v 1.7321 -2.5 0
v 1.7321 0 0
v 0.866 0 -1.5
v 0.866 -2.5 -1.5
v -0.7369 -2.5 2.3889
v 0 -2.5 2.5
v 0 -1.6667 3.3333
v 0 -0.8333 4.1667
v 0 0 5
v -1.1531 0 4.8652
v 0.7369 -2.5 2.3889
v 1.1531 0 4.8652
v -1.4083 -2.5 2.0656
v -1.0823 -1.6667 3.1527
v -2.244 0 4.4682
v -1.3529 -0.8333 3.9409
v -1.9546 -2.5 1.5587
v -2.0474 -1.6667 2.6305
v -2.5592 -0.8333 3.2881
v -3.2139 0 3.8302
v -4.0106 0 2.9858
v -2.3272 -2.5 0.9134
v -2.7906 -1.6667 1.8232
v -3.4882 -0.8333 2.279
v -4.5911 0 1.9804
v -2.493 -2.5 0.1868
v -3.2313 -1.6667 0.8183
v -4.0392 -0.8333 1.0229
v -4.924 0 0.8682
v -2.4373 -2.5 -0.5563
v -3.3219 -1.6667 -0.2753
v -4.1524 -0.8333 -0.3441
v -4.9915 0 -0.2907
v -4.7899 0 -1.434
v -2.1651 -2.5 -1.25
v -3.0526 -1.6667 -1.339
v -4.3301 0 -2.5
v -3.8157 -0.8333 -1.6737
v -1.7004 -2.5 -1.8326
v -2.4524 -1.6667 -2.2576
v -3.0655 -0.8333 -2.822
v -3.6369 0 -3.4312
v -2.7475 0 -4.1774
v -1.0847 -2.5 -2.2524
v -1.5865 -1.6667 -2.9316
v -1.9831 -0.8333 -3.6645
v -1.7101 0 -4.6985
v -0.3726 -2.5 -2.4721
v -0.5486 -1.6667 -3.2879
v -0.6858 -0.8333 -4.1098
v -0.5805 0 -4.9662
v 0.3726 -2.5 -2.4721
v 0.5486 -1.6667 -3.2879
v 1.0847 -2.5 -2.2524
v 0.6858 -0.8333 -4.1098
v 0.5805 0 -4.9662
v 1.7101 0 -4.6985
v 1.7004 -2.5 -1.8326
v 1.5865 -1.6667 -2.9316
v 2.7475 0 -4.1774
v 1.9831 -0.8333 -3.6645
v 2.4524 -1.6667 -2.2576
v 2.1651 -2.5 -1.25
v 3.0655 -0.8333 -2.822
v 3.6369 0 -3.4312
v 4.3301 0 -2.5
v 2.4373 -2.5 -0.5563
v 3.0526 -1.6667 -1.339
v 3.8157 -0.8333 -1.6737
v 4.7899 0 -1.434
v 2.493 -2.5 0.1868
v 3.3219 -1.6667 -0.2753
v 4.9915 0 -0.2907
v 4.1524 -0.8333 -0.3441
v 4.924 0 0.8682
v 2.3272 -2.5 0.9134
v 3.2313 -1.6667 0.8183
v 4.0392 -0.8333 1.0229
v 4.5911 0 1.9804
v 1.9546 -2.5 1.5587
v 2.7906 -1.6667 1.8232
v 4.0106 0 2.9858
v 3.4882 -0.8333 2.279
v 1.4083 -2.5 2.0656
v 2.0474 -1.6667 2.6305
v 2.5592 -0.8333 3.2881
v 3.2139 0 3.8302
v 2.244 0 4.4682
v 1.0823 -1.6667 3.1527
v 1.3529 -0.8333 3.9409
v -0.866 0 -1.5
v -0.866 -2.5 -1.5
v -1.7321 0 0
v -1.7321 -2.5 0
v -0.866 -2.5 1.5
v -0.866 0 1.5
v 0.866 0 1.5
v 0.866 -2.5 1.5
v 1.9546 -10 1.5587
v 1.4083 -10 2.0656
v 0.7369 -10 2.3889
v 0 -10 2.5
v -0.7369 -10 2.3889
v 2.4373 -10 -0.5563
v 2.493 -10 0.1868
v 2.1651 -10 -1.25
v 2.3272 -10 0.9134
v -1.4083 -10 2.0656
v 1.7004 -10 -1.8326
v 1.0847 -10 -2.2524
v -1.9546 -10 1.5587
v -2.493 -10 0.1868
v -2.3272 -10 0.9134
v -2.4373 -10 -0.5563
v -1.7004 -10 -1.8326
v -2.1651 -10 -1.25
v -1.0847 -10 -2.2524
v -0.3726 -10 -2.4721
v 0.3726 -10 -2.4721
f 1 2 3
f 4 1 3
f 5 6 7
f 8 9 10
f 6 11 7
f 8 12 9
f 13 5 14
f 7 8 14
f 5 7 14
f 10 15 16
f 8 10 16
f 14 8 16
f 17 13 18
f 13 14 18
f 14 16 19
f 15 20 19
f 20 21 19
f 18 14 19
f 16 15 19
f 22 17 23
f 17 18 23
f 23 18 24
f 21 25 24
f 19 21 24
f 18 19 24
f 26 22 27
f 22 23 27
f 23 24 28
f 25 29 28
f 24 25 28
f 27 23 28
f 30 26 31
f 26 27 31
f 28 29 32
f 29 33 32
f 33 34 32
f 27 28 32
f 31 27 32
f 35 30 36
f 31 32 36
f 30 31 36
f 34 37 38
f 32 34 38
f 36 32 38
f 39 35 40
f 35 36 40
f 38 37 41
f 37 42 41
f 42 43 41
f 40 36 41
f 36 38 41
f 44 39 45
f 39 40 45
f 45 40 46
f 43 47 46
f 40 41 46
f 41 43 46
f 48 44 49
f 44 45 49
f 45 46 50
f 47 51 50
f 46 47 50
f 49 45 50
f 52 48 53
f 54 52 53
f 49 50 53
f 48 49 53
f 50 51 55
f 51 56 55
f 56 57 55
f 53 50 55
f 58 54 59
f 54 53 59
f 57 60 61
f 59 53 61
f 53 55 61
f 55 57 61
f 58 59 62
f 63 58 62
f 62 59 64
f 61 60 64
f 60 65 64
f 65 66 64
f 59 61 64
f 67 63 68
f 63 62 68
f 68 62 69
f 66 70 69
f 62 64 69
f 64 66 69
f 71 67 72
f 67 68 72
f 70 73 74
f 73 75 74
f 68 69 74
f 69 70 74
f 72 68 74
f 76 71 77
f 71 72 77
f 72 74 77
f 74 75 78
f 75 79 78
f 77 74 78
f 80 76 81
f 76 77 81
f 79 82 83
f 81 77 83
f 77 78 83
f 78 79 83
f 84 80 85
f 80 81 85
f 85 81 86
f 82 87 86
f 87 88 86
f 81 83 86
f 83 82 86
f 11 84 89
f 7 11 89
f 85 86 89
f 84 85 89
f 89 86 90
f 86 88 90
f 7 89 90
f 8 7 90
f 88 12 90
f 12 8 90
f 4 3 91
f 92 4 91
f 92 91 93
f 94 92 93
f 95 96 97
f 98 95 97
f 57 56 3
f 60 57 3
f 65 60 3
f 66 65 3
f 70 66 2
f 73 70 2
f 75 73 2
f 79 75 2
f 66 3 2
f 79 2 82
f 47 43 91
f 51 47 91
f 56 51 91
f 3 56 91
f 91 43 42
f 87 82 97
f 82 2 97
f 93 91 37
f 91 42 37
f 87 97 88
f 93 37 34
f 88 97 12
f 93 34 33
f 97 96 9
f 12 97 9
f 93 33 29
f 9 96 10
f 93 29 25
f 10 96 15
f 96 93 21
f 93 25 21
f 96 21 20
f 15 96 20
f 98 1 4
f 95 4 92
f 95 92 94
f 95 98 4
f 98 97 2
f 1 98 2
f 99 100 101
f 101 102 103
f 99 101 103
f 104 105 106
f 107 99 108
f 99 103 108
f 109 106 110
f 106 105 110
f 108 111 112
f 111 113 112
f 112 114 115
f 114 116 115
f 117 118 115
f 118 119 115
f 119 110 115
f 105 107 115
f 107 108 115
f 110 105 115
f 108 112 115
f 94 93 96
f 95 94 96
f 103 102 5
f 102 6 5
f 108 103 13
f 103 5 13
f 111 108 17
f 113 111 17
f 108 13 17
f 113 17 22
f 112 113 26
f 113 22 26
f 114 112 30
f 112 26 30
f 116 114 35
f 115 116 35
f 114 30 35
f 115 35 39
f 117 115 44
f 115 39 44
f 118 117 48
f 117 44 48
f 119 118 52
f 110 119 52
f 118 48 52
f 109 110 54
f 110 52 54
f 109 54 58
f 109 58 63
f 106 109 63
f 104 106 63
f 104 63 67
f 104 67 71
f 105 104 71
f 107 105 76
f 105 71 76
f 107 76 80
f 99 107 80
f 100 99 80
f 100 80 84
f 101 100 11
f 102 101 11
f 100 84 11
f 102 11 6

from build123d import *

# Parameters (mm, degrees)
CUT_EXTRUDE1_DEPTH = 2.5


with BuildPart() as part:
    # Sketch1 → Revolve1 (revolve)
    with BuildSketch(Plane.XY, mode=Mode.PRIVATE) as revolve1_sk:
        Polygon((0, -10), (2.5, -10), (2.5, -2.5), (5, 0), (0, 0), align=None)
    revolve(revolve1_sk.sketch.rotate(Axis((0, 61.691642626, 0), (0, -1, 0)), 90), axis=Axis((0, 61.691642626, 0), (0, -1, 0)))

    # Sketch2 → Cut-Extrude1 (cut)
    with BuildSketch(Plane(origin=(0, 0, 0), x_dir=(-1, 0, 0), z_dir=(0, 1, 0))):
        Polygon((-0.866025404, -1.5), (0.866025404, -1.5), (1.732050808, 0), (0.866025404, 1.5), (-0.866025404, 1.5), (-1.732050808, 0), align=None)
    extrude(amount=-CUT_EXTRUDE1_DEPTH, mode=Mode.SUBTRACT)


solid = part.part
